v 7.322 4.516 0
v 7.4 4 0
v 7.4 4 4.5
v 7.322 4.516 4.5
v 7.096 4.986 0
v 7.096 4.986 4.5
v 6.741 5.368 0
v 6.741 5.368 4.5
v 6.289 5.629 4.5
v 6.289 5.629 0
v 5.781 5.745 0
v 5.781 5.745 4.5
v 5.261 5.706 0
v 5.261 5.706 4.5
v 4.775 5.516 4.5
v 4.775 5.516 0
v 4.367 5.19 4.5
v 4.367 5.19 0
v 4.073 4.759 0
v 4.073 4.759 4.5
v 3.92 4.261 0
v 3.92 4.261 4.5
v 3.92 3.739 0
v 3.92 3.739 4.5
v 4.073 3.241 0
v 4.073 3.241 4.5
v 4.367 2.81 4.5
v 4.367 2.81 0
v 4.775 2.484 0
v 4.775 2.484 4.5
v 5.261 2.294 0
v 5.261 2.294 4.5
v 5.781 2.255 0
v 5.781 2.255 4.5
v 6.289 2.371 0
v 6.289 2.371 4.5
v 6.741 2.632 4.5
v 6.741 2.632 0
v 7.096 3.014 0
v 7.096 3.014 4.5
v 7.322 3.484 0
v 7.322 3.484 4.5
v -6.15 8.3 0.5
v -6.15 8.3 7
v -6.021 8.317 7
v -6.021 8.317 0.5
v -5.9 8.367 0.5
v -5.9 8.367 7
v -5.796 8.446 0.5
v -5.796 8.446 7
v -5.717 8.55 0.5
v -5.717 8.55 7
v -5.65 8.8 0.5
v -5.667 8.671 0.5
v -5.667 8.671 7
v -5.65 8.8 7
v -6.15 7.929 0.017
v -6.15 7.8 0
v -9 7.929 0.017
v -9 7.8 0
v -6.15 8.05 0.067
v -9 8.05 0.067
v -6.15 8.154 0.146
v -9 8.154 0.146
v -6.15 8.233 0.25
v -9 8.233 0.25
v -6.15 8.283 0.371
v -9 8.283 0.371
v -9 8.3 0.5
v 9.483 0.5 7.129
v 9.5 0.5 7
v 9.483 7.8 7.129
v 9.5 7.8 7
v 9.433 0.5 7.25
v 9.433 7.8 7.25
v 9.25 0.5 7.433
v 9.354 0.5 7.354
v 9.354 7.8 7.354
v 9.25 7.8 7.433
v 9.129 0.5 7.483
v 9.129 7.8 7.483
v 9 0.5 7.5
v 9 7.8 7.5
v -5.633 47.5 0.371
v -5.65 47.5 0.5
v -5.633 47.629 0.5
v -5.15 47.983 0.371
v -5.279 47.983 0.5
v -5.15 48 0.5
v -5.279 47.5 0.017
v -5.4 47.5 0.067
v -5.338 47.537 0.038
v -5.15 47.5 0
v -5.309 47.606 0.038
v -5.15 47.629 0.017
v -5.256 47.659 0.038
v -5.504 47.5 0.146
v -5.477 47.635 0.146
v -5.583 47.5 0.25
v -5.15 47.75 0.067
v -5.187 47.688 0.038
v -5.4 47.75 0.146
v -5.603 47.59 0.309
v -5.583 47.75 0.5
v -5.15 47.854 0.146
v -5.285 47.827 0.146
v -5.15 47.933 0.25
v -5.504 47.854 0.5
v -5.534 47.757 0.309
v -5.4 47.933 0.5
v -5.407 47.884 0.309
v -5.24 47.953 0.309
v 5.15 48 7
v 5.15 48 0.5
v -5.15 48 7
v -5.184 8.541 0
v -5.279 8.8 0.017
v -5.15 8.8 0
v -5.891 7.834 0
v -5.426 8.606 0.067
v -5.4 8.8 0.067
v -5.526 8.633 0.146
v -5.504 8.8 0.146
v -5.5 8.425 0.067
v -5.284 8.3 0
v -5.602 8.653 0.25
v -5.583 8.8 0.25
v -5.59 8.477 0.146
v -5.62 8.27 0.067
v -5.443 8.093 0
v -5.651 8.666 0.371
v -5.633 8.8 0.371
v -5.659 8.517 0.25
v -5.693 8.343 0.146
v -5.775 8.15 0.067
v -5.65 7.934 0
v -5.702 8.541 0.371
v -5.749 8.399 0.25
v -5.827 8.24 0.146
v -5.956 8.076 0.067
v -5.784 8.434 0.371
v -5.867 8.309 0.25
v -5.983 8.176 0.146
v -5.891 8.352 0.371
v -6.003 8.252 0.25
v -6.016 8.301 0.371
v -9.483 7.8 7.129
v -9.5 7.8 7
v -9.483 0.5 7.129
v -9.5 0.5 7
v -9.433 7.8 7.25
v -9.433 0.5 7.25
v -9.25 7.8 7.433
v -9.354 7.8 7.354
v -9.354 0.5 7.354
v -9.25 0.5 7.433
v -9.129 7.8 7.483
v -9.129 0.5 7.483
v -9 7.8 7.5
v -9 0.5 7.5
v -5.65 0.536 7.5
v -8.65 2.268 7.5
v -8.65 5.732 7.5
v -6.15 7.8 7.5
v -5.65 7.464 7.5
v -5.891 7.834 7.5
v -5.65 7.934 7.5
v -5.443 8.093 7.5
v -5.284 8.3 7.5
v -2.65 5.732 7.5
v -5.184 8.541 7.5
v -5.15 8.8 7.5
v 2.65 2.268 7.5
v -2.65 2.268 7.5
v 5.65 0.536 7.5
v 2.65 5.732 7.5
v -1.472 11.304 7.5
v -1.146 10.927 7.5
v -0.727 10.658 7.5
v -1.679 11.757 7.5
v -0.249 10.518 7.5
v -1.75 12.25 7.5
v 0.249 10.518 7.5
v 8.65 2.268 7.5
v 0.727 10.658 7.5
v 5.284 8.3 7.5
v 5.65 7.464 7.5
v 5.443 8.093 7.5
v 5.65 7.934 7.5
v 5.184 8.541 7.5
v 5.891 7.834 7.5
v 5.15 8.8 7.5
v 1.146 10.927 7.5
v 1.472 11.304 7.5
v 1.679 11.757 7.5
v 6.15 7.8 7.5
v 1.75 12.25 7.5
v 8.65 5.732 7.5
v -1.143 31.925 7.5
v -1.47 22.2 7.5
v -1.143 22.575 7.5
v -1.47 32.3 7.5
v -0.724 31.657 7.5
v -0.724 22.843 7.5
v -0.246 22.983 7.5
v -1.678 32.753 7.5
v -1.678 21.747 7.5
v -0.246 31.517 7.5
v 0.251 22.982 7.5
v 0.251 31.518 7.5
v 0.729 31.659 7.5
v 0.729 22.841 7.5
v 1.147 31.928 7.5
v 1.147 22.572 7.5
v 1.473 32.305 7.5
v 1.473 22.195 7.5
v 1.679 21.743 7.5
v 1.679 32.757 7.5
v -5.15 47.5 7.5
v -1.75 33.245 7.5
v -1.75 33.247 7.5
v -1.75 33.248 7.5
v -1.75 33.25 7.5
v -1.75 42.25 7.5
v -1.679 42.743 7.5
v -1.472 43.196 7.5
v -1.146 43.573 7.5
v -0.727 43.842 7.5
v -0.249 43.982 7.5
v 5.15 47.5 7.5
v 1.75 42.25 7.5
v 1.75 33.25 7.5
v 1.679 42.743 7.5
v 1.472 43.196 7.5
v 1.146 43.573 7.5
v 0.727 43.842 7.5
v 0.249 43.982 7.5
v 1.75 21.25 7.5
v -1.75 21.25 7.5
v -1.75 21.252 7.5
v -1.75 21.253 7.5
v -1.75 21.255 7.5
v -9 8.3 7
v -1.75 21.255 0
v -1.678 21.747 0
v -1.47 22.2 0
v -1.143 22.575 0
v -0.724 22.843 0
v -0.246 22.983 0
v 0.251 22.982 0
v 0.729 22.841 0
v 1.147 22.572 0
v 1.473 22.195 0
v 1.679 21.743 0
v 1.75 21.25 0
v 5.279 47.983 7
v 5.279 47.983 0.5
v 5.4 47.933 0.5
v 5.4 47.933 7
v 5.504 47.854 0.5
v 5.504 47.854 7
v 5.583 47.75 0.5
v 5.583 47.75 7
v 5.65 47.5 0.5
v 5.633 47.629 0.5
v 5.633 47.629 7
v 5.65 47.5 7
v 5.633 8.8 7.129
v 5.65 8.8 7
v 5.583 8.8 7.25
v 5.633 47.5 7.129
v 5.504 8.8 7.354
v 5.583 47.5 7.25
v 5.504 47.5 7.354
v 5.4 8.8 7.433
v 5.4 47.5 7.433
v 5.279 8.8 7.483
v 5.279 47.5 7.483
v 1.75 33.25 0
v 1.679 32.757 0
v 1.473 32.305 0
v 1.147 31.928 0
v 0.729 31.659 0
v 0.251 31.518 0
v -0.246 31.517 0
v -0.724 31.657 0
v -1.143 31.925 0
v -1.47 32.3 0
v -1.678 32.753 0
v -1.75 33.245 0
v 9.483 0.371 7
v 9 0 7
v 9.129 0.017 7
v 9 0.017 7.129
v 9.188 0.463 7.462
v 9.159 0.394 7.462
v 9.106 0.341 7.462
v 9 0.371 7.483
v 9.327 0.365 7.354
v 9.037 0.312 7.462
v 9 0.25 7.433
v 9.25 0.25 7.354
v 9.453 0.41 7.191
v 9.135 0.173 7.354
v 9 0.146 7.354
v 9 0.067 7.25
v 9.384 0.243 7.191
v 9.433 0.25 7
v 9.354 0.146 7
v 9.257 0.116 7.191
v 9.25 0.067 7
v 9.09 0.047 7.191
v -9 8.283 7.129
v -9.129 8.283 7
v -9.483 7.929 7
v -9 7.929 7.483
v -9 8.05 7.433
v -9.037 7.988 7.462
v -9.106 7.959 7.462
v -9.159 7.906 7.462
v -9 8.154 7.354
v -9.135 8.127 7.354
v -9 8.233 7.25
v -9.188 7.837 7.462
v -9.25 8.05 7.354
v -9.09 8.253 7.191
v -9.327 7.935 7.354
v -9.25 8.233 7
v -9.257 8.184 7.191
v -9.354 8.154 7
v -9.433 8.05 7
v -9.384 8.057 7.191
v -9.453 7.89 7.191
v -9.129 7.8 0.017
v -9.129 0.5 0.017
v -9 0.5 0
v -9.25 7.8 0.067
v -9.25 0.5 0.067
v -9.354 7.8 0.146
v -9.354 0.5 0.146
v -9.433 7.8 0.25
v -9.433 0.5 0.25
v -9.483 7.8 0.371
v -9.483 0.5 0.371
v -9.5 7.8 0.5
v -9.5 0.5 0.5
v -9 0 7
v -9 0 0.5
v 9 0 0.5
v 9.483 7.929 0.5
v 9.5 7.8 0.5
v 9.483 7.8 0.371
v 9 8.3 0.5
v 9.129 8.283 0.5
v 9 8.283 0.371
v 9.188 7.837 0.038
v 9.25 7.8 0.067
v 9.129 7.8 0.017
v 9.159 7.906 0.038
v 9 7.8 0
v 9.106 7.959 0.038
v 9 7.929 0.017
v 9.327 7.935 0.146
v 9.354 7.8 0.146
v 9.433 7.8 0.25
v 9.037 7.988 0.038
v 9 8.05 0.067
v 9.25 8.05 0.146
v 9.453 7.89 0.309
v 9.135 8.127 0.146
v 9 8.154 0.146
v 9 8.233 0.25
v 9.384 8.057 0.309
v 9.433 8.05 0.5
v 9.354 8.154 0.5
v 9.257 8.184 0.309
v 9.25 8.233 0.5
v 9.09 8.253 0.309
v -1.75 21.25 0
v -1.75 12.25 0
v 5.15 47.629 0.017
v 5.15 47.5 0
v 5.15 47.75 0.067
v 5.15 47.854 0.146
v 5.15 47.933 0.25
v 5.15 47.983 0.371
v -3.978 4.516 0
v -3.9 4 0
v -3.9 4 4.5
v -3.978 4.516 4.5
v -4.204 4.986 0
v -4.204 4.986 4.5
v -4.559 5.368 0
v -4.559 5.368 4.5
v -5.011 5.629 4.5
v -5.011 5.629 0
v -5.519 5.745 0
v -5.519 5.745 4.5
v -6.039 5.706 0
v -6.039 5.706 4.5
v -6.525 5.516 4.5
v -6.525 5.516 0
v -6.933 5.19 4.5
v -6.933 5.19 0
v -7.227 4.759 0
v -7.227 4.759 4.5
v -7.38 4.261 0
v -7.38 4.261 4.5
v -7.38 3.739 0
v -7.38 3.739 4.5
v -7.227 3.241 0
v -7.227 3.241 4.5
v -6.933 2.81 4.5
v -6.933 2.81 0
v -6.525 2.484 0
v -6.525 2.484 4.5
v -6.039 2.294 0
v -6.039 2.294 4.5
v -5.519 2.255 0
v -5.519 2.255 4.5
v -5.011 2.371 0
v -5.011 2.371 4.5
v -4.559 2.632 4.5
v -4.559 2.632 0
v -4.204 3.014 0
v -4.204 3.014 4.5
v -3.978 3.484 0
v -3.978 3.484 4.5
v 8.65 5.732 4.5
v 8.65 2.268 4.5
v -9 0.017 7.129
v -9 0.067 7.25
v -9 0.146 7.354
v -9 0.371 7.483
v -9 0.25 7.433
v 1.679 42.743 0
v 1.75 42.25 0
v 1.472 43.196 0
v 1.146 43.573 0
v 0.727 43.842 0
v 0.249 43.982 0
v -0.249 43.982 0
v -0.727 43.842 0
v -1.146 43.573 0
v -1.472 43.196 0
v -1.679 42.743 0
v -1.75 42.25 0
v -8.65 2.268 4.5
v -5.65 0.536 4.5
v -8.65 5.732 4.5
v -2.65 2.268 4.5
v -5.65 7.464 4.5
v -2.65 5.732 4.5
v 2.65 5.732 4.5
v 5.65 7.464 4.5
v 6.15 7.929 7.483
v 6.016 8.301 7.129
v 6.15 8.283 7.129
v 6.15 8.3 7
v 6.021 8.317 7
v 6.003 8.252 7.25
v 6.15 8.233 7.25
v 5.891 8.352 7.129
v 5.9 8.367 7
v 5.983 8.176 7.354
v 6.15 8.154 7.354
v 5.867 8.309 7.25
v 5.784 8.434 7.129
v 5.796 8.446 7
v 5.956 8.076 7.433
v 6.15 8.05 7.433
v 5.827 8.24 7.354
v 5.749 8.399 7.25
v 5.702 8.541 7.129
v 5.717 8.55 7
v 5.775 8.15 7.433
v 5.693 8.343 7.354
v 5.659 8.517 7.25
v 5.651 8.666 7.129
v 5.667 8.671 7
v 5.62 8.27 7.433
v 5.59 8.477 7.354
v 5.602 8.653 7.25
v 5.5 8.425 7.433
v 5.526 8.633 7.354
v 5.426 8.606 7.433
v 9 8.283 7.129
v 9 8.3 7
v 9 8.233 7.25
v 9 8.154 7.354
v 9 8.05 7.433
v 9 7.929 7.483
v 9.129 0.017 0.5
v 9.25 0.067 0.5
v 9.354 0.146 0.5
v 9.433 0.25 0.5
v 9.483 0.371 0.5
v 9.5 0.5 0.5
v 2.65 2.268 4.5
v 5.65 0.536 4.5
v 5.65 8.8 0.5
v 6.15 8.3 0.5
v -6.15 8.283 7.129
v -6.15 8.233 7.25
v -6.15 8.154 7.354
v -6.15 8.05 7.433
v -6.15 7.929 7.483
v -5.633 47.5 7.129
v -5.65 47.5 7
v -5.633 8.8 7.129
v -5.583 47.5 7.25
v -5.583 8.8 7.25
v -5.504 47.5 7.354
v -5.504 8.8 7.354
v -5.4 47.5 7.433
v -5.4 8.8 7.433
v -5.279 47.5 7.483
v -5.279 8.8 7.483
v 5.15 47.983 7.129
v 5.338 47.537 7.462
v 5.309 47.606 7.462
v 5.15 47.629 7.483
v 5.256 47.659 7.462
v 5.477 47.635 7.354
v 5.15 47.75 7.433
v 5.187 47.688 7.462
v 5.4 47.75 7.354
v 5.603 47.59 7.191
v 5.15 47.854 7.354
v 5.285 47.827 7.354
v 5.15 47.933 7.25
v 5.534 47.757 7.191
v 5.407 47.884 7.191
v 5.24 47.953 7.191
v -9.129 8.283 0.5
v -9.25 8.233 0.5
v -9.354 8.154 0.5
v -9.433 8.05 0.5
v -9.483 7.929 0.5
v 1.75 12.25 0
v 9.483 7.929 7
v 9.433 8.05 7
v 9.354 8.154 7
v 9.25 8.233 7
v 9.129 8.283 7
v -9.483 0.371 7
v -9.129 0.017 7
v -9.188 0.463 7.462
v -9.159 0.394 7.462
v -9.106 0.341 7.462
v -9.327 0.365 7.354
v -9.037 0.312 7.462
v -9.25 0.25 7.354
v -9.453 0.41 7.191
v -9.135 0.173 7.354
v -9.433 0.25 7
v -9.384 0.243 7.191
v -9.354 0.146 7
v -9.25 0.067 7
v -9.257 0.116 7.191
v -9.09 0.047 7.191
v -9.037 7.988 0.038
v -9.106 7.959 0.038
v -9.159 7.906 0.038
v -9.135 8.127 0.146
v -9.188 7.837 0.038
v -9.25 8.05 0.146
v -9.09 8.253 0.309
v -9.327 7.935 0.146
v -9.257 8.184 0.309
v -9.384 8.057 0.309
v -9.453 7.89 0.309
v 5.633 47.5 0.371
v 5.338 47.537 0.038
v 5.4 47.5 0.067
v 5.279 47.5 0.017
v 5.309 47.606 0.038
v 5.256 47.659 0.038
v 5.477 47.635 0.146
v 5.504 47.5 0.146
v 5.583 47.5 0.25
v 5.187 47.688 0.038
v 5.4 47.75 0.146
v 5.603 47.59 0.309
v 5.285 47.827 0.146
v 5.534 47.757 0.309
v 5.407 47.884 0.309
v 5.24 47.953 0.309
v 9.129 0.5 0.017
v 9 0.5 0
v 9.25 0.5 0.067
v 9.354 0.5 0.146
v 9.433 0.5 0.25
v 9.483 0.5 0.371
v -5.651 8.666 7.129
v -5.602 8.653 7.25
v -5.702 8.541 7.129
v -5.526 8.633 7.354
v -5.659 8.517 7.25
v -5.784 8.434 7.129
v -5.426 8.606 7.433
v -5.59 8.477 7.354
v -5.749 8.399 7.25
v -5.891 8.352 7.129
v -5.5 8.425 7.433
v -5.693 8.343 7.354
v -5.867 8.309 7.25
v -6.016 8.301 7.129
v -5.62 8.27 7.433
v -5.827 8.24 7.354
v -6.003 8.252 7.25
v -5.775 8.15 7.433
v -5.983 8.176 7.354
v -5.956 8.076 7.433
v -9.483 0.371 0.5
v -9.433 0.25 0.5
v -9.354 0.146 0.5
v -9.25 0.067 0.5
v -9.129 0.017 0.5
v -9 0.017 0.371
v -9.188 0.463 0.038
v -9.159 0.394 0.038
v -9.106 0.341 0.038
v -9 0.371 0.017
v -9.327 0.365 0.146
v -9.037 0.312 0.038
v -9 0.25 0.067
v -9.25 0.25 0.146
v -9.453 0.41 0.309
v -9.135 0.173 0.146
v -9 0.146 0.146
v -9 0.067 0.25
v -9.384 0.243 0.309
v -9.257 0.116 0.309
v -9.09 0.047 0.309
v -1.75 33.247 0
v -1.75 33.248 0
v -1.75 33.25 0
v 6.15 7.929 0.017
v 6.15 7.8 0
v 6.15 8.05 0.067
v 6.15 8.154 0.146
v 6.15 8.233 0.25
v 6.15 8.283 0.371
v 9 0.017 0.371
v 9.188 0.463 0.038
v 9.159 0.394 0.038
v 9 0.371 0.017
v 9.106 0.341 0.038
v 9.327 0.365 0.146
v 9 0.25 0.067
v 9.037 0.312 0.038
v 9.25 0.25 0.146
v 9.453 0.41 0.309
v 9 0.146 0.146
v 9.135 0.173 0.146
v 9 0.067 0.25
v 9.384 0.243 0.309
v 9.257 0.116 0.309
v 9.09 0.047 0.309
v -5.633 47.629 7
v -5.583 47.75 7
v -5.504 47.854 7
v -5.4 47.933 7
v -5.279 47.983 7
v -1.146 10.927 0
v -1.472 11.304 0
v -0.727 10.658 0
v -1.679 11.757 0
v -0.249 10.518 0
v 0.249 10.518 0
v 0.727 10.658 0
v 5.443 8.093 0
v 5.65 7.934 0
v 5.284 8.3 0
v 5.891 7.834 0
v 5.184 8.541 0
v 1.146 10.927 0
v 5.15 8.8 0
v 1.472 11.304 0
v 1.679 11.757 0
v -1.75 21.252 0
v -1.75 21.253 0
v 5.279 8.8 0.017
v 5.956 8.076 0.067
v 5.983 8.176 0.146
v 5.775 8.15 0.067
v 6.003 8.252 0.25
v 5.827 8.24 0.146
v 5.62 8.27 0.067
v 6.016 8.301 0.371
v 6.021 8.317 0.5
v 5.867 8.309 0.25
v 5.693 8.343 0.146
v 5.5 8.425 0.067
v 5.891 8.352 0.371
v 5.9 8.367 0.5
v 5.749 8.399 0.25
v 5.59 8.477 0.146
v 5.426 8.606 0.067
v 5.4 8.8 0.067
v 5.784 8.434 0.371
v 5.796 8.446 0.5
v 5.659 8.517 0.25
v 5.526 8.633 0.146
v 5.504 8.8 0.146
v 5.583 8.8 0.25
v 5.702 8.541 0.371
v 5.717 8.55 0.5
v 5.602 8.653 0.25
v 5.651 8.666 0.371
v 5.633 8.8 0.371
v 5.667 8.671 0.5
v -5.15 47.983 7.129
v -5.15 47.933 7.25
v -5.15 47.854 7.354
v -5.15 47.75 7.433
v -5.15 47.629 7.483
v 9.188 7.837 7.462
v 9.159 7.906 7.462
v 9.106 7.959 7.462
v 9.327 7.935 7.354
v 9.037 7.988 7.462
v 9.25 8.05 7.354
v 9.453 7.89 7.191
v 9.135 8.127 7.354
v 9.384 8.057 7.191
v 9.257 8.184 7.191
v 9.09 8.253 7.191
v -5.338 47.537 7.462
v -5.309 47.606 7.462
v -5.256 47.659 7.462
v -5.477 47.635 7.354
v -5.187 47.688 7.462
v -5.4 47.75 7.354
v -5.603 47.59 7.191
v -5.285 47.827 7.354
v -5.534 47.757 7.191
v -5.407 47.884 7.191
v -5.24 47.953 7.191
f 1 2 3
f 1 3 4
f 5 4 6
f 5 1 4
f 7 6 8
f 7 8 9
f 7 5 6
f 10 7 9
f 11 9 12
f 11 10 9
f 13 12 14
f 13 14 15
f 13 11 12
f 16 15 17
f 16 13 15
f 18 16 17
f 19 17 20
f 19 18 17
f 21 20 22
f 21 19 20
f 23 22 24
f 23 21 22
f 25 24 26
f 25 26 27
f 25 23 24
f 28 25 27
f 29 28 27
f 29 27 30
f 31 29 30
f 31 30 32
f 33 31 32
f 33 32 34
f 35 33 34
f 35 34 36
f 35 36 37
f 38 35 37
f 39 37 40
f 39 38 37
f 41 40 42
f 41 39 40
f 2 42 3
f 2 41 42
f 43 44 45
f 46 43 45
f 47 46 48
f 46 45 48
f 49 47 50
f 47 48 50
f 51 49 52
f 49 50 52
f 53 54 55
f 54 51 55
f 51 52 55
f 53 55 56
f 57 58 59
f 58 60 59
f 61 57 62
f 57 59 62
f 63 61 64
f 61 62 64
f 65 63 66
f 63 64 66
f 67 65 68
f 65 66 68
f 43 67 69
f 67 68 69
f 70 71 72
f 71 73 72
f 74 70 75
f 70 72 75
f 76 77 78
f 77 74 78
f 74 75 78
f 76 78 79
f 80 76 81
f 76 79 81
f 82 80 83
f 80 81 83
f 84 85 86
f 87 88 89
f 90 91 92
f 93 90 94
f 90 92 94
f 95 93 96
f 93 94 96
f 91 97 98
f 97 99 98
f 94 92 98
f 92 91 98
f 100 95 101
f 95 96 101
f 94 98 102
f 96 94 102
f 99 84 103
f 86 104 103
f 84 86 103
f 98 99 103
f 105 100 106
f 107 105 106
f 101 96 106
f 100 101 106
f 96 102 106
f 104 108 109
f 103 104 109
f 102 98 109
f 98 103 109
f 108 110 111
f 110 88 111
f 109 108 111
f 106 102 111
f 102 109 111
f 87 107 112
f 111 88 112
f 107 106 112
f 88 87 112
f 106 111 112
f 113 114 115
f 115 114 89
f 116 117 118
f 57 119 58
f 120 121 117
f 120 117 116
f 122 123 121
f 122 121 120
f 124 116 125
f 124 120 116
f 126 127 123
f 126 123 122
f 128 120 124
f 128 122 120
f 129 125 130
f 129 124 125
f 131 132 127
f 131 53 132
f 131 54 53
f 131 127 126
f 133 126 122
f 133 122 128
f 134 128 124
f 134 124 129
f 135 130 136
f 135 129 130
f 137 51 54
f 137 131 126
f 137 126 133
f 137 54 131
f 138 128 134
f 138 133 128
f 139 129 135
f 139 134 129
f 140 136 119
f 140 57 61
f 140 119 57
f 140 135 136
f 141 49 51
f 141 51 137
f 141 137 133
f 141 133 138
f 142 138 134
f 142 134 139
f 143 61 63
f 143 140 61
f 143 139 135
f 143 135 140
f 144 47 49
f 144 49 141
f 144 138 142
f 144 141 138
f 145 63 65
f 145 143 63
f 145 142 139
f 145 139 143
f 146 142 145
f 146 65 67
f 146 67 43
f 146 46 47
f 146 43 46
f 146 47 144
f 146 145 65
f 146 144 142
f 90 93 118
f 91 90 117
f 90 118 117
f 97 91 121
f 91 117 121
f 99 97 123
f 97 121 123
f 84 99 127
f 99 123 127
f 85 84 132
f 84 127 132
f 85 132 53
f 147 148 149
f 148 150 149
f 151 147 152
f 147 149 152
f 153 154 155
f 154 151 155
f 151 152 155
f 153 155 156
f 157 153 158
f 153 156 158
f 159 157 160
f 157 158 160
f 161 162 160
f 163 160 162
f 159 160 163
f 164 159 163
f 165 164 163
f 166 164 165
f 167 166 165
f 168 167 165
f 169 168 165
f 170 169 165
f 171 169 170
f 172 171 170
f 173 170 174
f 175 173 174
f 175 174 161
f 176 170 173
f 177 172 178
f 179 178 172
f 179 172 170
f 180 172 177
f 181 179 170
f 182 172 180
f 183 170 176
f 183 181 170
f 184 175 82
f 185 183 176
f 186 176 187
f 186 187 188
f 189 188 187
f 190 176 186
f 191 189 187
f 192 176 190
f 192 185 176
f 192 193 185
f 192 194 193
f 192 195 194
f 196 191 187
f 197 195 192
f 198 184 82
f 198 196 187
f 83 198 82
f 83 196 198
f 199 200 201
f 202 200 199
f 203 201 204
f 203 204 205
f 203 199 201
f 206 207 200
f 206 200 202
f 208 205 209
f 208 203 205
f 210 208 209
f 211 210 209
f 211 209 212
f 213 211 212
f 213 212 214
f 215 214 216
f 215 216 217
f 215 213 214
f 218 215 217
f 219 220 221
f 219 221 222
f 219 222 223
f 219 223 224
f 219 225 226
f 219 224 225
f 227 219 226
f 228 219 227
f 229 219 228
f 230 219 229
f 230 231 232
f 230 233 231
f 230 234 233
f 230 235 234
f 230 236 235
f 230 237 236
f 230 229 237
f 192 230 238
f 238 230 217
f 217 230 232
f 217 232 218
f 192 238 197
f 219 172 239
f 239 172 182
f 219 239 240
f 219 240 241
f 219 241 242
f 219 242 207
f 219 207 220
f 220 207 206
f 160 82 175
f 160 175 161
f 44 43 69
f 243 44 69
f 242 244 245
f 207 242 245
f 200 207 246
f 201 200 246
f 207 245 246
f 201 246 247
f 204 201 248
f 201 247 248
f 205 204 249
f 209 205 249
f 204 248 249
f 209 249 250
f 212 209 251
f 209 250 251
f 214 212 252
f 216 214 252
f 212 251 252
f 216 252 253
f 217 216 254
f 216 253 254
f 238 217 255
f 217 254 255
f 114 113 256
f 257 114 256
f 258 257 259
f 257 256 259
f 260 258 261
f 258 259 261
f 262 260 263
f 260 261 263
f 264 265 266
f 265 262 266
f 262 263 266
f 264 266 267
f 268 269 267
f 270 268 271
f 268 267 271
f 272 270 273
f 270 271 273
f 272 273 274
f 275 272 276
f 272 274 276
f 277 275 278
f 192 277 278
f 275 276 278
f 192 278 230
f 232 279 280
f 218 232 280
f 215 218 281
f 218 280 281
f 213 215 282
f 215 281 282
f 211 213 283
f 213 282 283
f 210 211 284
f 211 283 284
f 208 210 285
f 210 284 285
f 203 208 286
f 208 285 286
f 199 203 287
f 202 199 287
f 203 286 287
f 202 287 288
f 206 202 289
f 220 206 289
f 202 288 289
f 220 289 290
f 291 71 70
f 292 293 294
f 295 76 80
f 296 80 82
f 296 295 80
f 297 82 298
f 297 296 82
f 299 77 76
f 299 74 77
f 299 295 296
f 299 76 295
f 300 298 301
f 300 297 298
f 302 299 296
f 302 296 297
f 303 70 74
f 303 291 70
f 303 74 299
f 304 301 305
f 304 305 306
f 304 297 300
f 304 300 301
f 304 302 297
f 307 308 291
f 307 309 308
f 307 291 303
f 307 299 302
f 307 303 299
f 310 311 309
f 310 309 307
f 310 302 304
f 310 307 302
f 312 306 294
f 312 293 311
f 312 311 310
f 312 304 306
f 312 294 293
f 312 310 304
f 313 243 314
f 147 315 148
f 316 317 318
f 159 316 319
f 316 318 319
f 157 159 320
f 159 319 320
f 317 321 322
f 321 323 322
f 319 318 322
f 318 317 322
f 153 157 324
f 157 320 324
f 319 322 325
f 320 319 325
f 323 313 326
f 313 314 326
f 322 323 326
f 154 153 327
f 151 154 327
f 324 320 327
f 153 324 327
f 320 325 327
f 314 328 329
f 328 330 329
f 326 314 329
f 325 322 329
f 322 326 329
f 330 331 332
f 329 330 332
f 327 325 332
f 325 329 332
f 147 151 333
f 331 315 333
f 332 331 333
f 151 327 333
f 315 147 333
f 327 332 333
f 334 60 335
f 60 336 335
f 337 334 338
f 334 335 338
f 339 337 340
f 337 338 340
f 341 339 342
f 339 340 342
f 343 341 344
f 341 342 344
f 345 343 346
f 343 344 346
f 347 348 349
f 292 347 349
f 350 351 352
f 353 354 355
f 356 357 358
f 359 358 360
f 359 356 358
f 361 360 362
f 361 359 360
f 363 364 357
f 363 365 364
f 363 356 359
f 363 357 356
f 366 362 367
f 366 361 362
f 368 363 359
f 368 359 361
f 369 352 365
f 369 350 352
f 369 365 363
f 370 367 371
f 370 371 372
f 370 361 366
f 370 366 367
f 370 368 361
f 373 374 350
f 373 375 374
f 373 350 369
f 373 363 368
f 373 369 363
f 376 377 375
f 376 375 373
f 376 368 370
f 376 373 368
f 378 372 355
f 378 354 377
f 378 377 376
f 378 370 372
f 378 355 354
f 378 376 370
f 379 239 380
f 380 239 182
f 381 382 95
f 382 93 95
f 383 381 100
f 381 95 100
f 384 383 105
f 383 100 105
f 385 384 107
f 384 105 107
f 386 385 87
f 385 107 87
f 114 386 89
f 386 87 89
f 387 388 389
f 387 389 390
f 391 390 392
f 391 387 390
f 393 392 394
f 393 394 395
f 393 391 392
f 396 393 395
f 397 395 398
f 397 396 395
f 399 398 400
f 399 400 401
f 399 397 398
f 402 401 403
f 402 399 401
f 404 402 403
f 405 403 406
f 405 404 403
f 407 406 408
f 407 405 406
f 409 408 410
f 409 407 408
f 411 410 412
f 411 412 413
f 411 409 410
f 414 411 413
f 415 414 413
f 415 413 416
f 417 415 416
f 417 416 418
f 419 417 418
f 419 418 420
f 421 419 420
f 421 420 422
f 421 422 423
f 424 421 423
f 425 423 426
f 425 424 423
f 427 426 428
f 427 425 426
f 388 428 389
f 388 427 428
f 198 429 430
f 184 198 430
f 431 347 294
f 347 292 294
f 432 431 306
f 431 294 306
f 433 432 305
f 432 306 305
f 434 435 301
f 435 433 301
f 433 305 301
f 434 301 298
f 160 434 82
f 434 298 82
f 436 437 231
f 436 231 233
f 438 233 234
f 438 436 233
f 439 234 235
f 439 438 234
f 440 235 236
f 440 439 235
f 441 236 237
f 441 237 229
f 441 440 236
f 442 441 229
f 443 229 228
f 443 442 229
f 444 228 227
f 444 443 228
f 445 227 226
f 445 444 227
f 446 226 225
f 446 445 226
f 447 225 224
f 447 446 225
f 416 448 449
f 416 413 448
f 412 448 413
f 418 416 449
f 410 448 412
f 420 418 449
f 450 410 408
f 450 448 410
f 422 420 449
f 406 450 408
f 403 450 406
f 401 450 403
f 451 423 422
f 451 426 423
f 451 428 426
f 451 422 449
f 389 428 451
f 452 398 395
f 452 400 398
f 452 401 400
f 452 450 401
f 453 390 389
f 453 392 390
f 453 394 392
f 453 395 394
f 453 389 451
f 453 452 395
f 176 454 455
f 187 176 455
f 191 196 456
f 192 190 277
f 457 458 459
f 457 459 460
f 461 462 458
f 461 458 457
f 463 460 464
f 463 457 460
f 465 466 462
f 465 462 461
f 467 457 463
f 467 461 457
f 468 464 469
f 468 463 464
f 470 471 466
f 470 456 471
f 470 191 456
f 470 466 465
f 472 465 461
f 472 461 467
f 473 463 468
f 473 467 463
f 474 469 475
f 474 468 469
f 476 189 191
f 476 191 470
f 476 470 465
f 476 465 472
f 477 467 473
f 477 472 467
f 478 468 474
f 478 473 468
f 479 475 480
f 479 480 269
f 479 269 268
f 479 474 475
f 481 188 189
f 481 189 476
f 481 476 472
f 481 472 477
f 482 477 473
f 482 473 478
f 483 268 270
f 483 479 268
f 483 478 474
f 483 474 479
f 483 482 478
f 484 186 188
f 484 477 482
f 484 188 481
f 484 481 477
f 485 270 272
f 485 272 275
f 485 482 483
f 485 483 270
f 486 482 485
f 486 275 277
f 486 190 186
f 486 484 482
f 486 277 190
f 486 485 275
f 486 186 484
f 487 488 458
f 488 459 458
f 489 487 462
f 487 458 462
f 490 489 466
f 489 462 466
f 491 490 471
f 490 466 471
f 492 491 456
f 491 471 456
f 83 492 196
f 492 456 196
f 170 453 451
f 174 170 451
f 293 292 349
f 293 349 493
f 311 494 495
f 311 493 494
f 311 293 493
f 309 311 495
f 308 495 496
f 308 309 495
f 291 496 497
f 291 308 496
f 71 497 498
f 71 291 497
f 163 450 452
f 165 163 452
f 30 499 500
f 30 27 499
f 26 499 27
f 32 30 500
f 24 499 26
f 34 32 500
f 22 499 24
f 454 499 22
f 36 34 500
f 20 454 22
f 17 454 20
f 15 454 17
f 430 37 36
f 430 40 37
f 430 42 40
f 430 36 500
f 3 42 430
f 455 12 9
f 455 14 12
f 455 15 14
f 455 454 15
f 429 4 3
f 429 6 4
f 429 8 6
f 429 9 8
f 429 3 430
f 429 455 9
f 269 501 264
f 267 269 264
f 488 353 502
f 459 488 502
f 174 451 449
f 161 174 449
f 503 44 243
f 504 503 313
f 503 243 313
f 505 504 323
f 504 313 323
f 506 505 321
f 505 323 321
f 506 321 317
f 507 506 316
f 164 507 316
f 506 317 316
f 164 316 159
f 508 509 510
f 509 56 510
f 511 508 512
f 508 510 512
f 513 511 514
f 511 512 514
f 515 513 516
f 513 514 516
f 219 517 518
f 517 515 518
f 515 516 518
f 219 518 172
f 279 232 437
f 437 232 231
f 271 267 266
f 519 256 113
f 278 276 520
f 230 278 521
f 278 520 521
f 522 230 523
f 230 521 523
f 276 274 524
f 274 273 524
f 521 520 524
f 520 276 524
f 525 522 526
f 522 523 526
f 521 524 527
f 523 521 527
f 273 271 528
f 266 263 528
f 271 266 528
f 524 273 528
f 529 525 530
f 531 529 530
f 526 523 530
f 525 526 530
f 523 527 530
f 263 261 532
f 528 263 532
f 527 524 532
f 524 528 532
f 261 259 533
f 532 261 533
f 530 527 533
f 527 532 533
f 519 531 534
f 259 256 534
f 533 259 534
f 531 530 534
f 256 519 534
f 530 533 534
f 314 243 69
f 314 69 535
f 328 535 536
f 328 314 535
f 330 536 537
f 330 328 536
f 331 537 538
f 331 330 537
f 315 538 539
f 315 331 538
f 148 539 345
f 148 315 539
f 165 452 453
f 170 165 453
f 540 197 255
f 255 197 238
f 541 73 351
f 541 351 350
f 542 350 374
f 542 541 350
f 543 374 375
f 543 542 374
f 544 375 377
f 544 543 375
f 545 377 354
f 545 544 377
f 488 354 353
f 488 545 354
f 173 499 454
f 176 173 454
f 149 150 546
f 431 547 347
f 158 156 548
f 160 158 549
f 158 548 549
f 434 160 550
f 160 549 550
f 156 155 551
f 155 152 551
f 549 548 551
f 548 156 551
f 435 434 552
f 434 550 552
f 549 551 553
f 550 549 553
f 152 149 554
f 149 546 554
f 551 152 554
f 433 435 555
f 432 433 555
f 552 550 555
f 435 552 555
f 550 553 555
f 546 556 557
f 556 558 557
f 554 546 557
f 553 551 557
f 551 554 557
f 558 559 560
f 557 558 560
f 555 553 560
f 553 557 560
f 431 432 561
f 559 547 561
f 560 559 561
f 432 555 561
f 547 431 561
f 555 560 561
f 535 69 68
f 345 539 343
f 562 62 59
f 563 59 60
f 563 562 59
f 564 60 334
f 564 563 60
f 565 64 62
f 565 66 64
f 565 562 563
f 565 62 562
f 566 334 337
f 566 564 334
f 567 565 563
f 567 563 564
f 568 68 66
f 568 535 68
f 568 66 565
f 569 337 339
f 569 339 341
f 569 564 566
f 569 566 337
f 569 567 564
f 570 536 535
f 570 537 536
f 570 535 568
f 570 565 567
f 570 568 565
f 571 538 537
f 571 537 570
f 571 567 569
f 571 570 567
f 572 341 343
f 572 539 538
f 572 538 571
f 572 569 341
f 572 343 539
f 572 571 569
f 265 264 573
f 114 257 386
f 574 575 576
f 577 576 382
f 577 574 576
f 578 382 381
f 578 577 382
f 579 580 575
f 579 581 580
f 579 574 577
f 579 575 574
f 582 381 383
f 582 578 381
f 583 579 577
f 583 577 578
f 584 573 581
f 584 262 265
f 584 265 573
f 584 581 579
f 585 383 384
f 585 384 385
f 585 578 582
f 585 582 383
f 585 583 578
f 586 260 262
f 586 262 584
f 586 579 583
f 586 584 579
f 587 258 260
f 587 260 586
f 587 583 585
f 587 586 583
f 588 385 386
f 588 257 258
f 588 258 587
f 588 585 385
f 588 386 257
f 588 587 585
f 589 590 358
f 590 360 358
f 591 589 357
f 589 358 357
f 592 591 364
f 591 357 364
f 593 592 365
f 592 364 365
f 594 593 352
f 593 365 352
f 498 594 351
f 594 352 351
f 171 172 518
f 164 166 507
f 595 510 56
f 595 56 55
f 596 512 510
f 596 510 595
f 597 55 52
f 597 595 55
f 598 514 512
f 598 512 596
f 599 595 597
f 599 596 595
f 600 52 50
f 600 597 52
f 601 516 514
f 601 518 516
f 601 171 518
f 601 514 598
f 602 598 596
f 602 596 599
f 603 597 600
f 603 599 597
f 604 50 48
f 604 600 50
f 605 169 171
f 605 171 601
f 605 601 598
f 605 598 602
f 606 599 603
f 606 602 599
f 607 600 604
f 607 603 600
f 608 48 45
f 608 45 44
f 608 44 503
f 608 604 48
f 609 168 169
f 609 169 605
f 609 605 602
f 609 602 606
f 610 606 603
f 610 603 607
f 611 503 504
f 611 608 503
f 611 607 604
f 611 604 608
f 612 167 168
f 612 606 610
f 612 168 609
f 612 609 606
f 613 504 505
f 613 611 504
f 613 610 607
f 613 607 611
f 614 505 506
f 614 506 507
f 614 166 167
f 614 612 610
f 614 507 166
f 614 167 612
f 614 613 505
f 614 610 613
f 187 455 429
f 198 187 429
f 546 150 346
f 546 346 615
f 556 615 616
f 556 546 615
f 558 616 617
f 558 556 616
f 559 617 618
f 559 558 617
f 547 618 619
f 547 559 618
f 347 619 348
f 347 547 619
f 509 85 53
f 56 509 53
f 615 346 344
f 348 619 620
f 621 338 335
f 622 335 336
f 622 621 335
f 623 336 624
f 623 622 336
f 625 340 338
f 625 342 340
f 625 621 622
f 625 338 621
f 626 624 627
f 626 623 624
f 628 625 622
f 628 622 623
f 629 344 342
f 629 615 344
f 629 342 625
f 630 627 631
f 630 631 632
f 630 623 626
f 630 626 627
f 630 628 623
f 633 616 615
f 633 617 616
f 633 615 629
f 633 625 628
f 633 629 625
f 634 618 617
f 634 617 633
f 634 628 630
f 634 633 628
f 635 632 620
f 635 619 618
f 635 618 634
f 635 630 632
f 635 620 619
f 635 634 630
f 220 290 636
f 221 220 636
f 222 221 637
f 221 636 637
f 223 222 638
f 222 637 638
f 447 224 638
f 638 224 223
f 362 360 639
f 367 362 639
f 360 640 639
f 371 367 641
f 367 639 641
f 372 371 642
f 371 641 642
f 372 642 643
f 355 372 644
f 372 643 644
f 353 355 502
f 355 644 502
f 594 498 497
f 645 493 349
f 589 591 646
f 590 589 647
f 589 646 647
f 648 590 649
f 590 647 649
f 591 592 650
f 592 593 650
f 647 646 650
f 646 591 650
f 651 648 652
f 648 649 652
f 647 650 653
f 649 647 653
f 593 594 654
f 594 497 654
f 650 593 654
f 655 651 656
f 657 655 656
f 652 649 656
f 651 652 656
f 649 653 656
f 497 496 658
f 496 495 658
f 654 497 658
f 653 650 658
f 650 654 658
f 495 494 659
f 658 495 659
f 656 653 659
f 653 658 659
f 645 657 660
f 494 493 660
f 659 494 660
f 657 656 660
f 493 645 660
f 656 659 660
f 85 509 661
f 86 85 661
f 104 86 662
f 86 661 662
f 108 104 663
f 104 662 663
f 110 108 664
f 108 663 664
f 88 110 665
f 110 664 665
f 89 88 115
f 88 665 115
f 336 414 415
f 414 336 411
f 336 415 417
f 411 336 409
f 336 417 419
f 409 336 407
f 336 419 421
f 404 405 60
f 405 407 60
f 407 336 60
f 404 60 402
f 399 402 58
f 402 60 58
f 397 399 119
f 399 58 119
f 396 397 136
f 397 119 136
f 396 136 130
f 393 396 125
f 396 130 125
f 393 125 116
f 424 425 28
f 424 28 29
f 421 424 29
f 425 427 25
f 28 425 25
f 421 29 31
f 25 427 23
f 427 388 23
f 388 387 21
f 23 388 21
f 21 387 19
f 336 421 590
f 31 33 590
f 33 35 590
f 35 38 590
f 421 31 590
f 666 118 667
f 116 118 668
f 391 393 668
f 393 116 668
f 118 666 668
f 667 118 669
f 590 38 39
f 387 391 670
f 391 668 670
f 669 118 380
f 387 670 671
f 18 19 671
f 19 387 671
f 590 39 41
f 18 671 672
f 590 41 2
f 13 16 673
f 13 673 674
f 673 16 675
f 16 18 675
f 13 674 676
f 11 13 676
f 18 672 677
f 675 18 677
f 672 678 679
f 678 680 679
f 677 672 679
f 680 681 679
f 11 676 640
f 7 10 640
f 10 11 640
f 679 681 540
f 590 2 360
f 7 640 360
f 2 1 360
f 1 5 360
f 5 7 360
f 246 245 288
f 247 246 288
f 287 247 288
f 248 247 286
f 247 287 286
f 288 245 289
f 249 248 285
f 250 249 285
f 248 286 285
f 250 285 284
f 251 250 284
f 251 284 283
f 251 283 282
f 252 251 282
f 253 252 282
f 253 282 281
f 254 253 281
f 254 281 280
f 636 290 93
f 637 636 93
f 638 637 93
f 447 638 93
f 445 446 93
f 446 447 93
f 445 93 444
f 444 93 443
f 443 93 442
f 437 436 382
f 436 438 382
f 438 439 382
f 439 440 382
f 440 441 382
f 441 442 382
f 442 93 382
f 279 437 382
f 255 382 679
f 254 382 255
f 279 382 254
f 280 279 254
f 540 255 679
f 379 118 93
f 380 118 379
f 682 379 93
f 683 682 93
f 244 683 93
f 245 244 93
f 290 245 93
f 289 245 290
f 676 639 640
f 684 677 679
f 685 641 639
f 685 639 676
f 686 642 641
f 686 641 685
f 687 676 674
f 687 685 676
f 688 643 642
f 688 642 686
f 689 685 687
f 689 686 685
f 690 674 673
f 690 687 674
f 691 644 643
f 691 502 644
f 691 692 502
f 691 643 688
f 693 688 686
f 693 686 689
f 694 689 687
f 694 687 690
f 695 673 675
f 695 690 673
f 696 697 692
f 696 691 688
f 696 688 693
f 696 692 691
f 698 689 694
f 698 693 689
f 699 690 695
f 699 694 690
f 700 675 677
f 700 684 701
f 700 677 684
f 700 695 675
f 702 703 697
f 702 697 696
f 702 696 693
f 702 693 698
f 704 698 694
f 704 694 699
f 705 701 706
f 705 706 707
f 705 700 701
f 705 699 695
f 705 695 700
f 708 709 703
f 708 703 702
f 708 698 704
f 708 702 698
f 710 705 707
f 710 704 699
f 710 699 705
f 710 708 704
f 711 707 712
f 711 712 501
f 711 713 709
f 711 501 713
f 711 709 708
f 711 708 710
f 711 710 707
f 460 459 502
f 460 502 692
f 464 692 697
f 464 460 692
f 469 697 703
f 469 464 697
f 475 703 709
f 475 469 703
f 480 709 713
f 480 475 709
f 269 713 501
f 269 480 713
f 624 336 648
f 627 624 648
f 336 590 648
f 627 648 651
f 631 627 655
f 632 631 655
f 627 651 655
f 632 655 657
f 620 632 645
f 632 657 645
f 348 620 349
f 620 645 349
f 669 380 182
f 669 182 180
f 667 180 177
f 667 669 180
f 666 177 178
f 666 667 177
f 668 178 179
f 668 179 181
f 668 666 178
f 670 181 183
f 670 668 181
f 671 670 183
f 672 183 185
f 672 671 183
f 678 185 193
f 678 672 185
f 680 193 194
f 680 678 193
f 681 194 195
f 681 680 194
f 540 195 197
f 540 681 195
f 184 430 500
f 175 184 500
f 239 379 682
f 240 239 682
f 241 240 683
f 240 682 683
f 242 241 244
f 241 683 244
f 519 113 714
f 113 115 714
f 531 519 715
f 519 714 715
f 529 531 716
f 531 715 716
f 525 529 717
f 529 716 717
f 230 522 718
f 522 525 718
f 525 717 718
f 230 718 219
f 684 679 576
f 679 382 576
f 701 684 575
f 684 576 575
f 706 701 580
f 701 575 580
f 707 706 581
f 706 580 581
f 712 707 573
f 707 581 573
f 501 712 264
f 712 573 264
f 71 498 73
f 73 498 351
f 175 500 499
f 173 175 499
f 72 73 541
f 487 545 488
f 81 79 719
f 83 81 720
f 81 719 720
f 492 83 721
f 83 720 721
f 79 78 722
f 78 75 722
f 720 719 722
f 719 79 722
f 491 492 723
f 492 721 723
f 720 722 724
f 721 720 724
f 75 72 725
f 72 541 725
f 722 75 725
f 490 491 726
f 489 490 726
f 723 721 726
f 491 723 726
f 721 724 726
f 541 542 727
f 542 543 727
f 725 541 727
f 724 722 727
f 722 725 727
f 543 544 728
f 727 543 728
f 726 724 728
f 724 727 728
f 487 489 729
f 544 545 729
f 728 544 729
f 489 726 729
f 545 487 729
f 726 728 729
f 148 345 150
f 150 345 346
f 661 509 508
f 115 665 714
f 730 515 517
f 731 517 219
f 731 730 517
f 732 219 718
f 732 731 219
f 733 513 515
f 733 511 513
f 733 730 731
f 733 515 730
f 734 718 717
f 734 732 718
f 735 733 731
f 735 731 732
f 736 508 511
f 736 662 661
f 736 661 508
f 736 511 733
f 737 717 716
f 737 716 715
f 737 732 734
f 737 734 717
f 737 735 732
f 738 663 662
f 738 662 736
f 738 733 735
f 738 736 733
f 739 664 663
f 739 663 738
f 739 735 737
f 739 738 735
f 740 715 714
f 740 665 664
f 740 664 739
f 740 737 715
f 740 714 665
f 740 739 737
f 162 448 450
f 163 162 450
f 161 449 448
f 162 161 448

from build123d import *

# Parameters (mm, degrees)
F0_R     = 1.75
F1_DEPTH = 7.5
F2_DEPTH = 4.5
F3_DEPTH = 4.5
F5_DEPTH = 8.81
F7_DEPTH = 25
F8_F1_R  = 0.5
F8_F2_R  = 0.5


with BuildPart() as f1:
    # F0 (on Top) → F1 (new body)
    with BuildSketch(Plane.XY):
        Polygon((-9.5, 0), (-5.65, 0), (5.65, 0), (9.5, 0), (9.5, 8.3), (5.65, 8.3), (5.65, 10.5504491955), (5.65, 11.4643116325), (5.65, 48), (-5.65, 48), (-5.65, 8.3), (-9.5, 8.3), align=None)
        Polygon((-5.65, 7.4641016151), (-2.65, 5.7320508076), (-2.65, 2.2679491924), (-5.65, 0.5358983849), (-8.65, 2.2679491924), (-8.65, 5.7320508076), align=None, mode=Mode.SUBTRACT)
        Polygon((2.65, 5.7320508076), (5.65, 7.4641016151), (8.65, 5.7320508076), (8.65, 2.2679491924), (5.65, 0.5358983849), (2.65, 2.2679491924), align=None, mode=Mode.SUBTRACT)
        with Locations((0, 12.25)):
            Circle(F0_R, mode=Mode.SUBTRACT)
        with BuildLine():
            ThreePointArc((-1.7499927683, 21.255030998), (0.0025155016, 22.9999981921), (1.75, 21.25))
            ThreePointArc((1.75, 21.25), (1.7499981921, 21.2474844984), (1.7499927683, 21.244969002))
            ThreePointArc((1.7499927683, 21.244969002), (-0.005030998, 19.5000072317), (-1.7499927683, 21.255030998))
        make_face(mode=Mode.SUBTRACT)
        with BuildLine():
            ThreePointArc((-1.7499927683, 33.244969002), (-0.005030998, 34.9999927683), (1.7499927683, 33.255030998))
            ThreePointArc((1.7499927683, 33.255030998), (1.7499981921, 33.2525155016), (1.75, 33.25))
            ThreePointArc((1.75, 33.25), (0.0025155016, 31.5000018079), (-1.7499927683, 33.244969002))
        make_face(mode=Mode.SUBTRACT)
        with Locations((0, 42.25)):
            Circle(F0_R, mode=Mode.SUBTRACT)
    extrude(amount=F1_DEPTH)

    # F0 (on Top) → F2 (join)
    with BuildSketch(Plane.XY):
        Polygon((-2.65, 2.2679491924), (-2.65, 5.7320508076), (-5.65, 7.4641016151), (-8.65, 5.7320508076), (-8.65, 2.2679491924), (-5.65, 0.5358983849), align=None)
        with Locations((-5.65, 4)):
            Circle(F0_R, mode=Mode.SUBTRACT)
    extrude(amount=F2_DEPTH)

    # F0 (on Top) → F3 (join)
    with BuildSketch(Plane.XY):
        Polygon((8.65, 5.7320508076), (5.65, 7.4641016151), (2.65, 5.7320508076), (2.65, 2.2679491924), (5.65, 0.5358983849), (8.65, 2.2679491924), align=None)
        with Locations((5.65, 4)):
            Circle(F0_R, mode=Mode.SUBTRACT)
    extrude(amount=F3_DEPTH)

    # F4 (on face) → F5 (cut)
    with BuildSketch(Plane.XY.offset(7.5)):
        with BuildLine():
            Line((-1.75, 21.25), (-1.75, 12.25))
            ThreePointArc((-1.75, 12.25), (0, 14), (1.75, 12.25))
            Line((1.75, 12.25), (1.75, 21.25))
            ThreePointArc((1.75, 21.25), (0, 19.5), (-1.75, 21.25))
        make_face()
    extrude(amount=-F5_DEPTH, mode=Mode.SUBTRACT)

    # F6 (on face) → F7 (cut)
    with BuildSketch(Plane.XY.offset(7.5)):
        with BuildLine():
            Line((-1.75, 42.25), (-1.75, 33.25))
            ThreePointArc((-1.75, 33.25), (0, 35), (1.75, 33.25))
            Line((1.75, 33.25), (1.75, 42.25))
            ThreePointArc((1.75, 42.25), (0, 40.5), (-1.75, 42.25))
        make_face()
    extrude(amount=-F7_DEPTH, mode=Mode.SUBTRACT)

    # F8: fillet of radius 0.5 on 20 edges, made by hand

    # F8_f1
    f8_f1_edges = [f1.edges().sort_by_distance(p)[0] for p in [
        (5.65, 8.3, 3.75),
        (-5.65, 8.3, 3.75),
    ]]
    fillet(f8_f1_edges, radius=F8_F1_R)

    # F8_f2
    f8_f2_edges = [f1.edges().sort_by_distance(p)[0] for p in [
        (-5.65, 48, 3.75),
        (5.65, 48, 3.75),
        (9.5, 8.3, 3.75),
        (-9.5, 8.3, 3.75),
        (-9.5, 0, 3.75),
        (9.5, 0, 3.75),
        (9.5, 4.15, 0),
        (9.5, 4.15, 7.5),
        (5.65, 28.4, 7.5),
        (5.65, 28.4, 0),
        (-5.65, 28.4, 0),
        (-5.65, 28.4, 7.5),
        (-9.5, 4.15, 0),
        (-9.5, 4.15, 7.5),
        (0, 48, 0),
        (0, 48, 7.5),
        (0, 0, 7.5),
        (0, 0, 0),
        (-5.7964466094, 8.4464466094, 7.5),
        (-5.7964466094, 8.4464466094, 0),
        (5.7964466094, 8.4464466094, 0),
        (5.7964466094, 8.4464466094, 7.5),
    ]]
    fillet(f8_f2_edges, radius=F8_F2_R)


solid = f1.part
